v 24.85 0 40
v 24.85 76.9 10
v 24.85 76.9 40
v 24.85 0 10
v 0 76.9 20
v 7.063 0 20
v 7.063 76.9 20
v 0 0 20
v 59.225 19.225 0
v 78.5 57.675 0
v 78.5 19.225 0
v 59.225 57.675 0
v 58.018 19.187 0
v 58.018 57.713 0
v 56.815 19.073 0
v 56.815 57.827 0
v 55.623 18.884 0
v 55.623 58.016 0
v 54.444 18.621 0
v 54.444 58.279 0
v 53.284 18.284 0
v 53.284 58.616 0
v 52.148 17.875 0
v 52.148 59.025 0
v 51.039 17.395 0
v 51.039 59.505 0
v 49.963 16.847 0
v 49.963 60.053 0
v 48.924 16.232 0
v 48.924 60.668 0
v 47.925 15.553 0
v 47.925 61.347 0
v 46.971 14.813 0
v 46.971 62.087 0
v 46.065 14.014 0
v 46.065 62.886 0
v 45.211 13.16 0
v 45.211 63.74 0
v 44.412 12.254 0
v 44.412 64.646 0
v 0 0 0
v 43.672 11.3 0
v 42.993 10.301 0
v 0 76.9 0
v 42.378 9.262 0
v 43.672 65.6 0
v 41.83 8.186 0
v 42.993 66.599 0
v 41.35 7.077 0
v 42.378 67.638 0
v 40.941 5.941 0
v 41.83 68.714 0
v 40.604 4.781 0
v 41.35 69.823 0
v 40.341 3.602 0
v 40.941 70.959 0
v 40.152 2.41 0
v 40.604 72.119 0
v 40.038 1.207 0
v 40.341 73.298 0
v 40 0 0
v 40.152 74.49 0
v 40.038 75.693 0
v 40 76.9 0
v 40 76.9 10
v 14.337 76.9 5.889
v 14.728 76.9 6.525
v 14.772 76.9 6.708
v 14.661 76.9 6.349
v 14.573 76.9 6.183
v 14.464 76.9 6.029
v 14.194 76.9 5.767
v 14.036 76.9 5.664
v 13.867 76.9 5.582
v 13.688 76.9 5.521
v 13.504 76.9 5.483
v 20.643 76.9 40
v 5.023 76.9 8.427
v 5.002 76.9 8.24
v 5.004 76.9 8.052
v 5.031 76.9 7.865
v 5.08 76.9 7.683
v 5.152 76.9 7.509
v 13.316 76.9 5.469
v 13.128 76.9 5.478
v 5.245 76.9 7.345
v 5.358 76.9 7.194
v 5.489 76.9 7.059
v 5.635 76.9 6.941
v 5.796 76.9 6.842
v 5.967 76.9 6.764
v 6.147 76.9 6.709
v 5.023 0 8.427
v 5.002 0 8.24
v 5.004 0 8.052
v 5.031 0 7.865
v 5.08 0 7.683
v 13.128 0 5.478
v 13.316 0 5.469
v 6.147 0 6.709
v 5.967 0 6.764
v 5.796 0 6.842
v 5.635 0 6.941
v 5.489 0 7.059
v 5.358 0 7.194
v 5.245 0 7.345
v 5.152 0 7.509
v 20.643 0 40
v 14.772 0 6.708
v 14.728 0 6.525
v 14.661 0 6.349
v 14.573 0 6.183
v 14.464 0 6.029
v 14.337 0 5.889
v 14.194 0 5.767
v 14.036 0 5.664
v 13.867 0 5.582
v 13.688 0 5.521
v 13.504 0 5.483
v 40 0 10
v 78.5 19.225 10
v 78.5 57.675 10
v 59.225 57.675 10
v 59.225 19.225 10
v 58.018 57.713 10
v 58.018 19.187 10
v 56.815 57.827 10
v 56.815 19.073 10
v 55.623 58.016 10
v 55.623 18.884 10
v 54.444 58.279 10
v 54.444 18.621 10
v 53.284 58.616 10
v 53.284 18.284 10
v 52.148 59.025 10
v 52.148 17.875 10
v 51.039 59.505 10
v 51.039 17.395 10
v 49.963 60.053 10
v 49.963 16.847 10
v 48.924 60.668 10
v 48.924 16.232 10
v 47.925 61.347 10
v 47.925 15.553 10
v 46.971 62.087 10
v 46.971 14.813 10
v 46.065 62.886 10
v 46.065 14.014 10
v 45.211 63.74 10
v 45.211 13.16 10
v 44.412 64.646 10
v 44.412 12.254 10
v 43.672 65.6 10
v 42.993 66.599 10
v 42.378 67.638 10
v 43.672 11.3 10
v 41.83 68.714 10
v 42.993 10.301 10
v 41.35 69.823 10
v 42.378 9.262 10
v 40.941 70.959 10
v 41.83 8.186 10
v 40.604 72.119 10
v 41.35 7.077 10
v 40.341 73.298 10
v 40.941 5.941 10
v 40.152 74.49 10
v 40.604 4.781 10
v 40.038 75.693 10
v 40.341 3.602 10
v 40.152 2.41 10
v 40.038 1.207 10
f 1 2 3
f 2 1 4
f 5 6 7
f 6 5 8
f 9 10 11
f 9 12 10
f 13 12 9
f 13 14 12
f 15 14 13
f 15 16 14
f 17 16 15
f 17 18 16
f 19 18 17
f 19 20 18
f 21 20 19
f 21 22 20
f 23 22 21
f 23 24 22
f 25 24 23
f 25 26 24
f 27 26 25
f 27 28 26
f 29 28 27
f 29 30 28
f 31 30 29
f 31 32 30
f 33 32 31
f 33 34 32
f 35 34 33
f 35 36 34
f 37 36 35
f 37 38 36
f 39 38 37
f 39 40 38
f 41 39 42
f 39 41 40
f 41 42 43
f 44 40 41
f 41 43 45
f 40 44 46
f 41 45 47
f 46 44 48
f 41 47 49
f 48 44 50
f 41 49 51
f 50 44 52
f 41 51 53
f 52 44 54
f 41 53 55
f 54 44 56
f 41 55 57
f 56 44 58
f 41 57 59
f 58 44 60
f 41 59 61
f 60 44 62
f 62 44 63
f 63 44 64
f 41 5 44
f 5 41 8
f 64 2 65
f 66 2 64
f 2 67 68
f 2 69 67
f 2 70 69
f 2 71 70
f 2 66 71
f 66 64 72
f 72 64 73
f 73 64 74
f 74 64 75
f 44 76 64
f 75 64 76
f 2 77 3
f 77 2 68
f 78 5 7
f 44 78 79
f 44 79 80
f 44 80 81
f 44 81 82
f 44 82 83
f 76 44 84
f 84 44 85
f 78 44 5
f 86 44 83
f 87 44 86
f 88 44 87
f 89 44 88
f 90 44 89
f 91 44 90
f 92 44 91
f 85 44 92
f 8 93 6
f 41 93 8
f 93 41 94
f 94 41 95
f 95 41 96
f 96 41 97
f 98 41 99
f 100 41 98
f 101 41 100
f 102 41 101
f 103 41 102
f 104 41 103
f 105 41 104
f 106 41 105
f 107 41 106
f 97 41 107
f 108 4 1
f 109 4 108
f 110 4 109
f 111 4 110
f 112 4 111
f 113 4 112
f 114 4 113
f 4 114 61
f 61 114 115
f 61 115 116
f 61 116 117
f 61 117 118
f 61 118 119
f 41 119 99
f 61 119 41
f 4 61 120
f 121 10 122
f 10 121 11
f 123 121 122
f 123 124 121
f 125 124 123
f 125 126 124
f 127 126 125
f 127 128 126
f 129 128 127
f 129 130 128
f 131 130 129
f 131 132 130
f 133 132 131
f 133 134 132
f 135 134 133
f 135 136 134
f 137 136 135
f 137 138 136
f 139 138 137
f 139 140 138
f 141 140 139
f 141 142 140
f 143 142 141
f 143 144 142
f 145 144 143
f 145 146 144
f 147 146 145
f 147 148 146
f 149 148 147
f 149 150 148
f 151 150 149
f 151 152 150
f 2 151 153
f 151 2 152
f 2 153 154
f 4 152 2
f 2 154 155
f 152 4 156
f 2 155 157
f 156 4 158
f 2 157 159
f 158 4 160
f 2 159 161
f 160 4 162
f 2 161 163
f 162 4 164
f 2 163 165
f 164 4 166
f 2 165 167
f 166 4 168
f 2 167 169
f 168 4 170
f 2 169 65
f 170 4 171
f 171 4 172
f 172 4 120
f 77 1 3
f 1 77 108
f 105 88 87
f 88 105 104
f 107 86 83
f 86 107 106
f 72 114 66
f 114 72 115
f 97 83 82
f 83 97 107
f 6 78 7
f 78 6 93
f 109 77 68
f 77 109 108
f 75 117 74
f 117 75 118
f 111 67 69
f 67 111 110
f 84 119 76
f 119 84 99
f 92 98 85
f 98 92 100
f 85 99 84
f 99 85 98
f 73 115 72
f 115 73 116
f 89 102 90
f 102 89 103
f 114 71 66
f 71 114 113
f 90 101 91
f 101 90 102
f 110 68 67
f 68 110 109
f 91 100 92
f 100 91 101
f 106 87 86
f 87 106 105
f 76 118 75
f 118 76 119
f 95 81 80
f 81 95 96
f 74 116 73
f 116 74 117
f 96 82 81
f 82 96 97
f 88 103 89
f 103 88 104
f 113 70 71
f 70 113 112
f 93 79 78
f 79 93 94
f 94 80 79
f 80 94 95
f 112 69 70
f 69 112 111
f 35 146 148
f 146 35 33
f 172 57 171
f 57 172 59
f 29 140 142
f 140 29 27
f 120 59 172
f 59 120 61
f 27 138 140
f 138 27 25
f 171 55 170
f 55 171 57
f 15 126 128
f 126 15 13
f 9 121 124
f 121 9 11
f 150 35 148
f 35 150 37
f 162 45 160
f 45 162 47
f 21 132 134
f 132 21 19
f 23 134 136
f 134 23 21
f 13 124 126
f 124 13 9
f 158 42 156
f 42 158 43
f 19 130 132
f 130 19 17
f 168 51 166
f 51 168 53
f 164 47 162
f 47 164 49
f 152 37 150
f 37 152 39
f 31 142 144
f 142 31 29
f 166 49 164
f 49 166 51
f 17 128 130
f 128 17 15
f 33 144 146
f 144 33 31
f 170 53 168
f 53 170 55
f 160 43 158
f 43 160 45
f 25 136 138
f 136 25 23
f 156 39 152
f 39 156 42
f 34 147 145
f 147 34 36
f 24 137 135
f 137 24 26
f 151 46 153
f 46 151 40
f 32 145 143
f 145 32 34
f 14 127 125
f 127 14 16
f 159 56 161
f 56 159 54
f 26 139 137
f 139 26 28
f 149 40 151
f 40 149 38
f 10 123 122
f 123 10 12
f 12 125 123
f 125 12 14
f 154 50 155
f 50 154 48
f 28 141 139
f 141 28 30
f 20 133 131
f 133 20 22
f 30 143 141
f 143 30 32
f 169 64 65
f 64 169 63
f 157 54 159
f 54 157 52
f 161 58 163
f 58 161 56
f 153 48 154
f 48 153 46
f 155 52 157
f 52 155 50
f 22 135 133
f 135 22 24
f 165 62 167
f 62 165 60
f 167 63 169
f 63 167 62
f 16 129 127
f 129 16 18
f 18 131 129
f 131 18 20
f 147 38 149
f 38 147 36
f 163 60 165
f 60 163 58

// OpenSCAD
phoneHeight = 8.4 + 1.5;
phoneLength = 157;
phoneWidth = 76.9;
phoneR = 1.5;
baseheight = 20;
incr=10;
baseWidthFactor = 2;
baseThinFactor = 4;

module phone() {
    translate([phoneR, phoneWidth / 2, phoneR])
    {
        rotate([90, 10, 0])
        {
            $fn=50;

            hull() {
                hull() {
                    translate([0,phoneLength - phoneR, 0])
                    {
                        cylinder(r=phoneR, h=phoneWidth, center=true);
                    }
                    cylinder(r=phoneR, h=phoneWidth, center=true);
                }

                translate([phoneHeight - phoneR * 2,0,0])
                {
                    hull() {
                        translate([0,phoneLength - phoneR, 0])
                        {
                            cylinder(r=phoneR, h=phoneWidth, center=true);
                        }
                        cylinder(r=phoneR, h=phoneWidth, center=true);
                    }
                }
            }
        }
    }
}


module support() {
    difference()
    {
        union() {
            cube([incr + phoneHeight * 1.5,phoneWidth , baseheight]);

            
            translate([incr + phoneHeight * 1.5,0,0]) cube([phoneLength / baseWidthFactor - (incr + phoneHeight * 1.5), phoneWidth, baseheight / 2]);

            translate([incr + phoneHeight / 2,0,baseheight]) cube([phoneHeight, phoneWidth, baseheight]);
        }

        translate([incr / 2, 0 ,baseheight /3]) {
            rotate([0, 0, 0])
            {
                phone();
            }
        }

        translate([incr * 4, - phoneWidth / baseThinFactor ,0]) baseThin();
        translate([incr * 4, phoneWidth - phoneWidth / baseThinFactor ,baseheight /3]) baseThin();
    }
}

module baseThin() {
    xTranslateBaseThin = (phoneLength / baseWidthFactor - (incr + phoneHeight * 1.5)) - 10;
    $fn = 100;

    translate([phoneWidth / baseThinFactor, phoneWidth / baseThinFactor, -baseheight /2]) {
        hull() {
            translate([xTranslateBaseThin,0,0])
            {
                cylinder(r=phoneWidth / baseThinFactor, h=baseheight);
            }

            cylinder(r=phoneWidth / baseThinFactor, h=baseheight);    
        }        
    }
}

support();
